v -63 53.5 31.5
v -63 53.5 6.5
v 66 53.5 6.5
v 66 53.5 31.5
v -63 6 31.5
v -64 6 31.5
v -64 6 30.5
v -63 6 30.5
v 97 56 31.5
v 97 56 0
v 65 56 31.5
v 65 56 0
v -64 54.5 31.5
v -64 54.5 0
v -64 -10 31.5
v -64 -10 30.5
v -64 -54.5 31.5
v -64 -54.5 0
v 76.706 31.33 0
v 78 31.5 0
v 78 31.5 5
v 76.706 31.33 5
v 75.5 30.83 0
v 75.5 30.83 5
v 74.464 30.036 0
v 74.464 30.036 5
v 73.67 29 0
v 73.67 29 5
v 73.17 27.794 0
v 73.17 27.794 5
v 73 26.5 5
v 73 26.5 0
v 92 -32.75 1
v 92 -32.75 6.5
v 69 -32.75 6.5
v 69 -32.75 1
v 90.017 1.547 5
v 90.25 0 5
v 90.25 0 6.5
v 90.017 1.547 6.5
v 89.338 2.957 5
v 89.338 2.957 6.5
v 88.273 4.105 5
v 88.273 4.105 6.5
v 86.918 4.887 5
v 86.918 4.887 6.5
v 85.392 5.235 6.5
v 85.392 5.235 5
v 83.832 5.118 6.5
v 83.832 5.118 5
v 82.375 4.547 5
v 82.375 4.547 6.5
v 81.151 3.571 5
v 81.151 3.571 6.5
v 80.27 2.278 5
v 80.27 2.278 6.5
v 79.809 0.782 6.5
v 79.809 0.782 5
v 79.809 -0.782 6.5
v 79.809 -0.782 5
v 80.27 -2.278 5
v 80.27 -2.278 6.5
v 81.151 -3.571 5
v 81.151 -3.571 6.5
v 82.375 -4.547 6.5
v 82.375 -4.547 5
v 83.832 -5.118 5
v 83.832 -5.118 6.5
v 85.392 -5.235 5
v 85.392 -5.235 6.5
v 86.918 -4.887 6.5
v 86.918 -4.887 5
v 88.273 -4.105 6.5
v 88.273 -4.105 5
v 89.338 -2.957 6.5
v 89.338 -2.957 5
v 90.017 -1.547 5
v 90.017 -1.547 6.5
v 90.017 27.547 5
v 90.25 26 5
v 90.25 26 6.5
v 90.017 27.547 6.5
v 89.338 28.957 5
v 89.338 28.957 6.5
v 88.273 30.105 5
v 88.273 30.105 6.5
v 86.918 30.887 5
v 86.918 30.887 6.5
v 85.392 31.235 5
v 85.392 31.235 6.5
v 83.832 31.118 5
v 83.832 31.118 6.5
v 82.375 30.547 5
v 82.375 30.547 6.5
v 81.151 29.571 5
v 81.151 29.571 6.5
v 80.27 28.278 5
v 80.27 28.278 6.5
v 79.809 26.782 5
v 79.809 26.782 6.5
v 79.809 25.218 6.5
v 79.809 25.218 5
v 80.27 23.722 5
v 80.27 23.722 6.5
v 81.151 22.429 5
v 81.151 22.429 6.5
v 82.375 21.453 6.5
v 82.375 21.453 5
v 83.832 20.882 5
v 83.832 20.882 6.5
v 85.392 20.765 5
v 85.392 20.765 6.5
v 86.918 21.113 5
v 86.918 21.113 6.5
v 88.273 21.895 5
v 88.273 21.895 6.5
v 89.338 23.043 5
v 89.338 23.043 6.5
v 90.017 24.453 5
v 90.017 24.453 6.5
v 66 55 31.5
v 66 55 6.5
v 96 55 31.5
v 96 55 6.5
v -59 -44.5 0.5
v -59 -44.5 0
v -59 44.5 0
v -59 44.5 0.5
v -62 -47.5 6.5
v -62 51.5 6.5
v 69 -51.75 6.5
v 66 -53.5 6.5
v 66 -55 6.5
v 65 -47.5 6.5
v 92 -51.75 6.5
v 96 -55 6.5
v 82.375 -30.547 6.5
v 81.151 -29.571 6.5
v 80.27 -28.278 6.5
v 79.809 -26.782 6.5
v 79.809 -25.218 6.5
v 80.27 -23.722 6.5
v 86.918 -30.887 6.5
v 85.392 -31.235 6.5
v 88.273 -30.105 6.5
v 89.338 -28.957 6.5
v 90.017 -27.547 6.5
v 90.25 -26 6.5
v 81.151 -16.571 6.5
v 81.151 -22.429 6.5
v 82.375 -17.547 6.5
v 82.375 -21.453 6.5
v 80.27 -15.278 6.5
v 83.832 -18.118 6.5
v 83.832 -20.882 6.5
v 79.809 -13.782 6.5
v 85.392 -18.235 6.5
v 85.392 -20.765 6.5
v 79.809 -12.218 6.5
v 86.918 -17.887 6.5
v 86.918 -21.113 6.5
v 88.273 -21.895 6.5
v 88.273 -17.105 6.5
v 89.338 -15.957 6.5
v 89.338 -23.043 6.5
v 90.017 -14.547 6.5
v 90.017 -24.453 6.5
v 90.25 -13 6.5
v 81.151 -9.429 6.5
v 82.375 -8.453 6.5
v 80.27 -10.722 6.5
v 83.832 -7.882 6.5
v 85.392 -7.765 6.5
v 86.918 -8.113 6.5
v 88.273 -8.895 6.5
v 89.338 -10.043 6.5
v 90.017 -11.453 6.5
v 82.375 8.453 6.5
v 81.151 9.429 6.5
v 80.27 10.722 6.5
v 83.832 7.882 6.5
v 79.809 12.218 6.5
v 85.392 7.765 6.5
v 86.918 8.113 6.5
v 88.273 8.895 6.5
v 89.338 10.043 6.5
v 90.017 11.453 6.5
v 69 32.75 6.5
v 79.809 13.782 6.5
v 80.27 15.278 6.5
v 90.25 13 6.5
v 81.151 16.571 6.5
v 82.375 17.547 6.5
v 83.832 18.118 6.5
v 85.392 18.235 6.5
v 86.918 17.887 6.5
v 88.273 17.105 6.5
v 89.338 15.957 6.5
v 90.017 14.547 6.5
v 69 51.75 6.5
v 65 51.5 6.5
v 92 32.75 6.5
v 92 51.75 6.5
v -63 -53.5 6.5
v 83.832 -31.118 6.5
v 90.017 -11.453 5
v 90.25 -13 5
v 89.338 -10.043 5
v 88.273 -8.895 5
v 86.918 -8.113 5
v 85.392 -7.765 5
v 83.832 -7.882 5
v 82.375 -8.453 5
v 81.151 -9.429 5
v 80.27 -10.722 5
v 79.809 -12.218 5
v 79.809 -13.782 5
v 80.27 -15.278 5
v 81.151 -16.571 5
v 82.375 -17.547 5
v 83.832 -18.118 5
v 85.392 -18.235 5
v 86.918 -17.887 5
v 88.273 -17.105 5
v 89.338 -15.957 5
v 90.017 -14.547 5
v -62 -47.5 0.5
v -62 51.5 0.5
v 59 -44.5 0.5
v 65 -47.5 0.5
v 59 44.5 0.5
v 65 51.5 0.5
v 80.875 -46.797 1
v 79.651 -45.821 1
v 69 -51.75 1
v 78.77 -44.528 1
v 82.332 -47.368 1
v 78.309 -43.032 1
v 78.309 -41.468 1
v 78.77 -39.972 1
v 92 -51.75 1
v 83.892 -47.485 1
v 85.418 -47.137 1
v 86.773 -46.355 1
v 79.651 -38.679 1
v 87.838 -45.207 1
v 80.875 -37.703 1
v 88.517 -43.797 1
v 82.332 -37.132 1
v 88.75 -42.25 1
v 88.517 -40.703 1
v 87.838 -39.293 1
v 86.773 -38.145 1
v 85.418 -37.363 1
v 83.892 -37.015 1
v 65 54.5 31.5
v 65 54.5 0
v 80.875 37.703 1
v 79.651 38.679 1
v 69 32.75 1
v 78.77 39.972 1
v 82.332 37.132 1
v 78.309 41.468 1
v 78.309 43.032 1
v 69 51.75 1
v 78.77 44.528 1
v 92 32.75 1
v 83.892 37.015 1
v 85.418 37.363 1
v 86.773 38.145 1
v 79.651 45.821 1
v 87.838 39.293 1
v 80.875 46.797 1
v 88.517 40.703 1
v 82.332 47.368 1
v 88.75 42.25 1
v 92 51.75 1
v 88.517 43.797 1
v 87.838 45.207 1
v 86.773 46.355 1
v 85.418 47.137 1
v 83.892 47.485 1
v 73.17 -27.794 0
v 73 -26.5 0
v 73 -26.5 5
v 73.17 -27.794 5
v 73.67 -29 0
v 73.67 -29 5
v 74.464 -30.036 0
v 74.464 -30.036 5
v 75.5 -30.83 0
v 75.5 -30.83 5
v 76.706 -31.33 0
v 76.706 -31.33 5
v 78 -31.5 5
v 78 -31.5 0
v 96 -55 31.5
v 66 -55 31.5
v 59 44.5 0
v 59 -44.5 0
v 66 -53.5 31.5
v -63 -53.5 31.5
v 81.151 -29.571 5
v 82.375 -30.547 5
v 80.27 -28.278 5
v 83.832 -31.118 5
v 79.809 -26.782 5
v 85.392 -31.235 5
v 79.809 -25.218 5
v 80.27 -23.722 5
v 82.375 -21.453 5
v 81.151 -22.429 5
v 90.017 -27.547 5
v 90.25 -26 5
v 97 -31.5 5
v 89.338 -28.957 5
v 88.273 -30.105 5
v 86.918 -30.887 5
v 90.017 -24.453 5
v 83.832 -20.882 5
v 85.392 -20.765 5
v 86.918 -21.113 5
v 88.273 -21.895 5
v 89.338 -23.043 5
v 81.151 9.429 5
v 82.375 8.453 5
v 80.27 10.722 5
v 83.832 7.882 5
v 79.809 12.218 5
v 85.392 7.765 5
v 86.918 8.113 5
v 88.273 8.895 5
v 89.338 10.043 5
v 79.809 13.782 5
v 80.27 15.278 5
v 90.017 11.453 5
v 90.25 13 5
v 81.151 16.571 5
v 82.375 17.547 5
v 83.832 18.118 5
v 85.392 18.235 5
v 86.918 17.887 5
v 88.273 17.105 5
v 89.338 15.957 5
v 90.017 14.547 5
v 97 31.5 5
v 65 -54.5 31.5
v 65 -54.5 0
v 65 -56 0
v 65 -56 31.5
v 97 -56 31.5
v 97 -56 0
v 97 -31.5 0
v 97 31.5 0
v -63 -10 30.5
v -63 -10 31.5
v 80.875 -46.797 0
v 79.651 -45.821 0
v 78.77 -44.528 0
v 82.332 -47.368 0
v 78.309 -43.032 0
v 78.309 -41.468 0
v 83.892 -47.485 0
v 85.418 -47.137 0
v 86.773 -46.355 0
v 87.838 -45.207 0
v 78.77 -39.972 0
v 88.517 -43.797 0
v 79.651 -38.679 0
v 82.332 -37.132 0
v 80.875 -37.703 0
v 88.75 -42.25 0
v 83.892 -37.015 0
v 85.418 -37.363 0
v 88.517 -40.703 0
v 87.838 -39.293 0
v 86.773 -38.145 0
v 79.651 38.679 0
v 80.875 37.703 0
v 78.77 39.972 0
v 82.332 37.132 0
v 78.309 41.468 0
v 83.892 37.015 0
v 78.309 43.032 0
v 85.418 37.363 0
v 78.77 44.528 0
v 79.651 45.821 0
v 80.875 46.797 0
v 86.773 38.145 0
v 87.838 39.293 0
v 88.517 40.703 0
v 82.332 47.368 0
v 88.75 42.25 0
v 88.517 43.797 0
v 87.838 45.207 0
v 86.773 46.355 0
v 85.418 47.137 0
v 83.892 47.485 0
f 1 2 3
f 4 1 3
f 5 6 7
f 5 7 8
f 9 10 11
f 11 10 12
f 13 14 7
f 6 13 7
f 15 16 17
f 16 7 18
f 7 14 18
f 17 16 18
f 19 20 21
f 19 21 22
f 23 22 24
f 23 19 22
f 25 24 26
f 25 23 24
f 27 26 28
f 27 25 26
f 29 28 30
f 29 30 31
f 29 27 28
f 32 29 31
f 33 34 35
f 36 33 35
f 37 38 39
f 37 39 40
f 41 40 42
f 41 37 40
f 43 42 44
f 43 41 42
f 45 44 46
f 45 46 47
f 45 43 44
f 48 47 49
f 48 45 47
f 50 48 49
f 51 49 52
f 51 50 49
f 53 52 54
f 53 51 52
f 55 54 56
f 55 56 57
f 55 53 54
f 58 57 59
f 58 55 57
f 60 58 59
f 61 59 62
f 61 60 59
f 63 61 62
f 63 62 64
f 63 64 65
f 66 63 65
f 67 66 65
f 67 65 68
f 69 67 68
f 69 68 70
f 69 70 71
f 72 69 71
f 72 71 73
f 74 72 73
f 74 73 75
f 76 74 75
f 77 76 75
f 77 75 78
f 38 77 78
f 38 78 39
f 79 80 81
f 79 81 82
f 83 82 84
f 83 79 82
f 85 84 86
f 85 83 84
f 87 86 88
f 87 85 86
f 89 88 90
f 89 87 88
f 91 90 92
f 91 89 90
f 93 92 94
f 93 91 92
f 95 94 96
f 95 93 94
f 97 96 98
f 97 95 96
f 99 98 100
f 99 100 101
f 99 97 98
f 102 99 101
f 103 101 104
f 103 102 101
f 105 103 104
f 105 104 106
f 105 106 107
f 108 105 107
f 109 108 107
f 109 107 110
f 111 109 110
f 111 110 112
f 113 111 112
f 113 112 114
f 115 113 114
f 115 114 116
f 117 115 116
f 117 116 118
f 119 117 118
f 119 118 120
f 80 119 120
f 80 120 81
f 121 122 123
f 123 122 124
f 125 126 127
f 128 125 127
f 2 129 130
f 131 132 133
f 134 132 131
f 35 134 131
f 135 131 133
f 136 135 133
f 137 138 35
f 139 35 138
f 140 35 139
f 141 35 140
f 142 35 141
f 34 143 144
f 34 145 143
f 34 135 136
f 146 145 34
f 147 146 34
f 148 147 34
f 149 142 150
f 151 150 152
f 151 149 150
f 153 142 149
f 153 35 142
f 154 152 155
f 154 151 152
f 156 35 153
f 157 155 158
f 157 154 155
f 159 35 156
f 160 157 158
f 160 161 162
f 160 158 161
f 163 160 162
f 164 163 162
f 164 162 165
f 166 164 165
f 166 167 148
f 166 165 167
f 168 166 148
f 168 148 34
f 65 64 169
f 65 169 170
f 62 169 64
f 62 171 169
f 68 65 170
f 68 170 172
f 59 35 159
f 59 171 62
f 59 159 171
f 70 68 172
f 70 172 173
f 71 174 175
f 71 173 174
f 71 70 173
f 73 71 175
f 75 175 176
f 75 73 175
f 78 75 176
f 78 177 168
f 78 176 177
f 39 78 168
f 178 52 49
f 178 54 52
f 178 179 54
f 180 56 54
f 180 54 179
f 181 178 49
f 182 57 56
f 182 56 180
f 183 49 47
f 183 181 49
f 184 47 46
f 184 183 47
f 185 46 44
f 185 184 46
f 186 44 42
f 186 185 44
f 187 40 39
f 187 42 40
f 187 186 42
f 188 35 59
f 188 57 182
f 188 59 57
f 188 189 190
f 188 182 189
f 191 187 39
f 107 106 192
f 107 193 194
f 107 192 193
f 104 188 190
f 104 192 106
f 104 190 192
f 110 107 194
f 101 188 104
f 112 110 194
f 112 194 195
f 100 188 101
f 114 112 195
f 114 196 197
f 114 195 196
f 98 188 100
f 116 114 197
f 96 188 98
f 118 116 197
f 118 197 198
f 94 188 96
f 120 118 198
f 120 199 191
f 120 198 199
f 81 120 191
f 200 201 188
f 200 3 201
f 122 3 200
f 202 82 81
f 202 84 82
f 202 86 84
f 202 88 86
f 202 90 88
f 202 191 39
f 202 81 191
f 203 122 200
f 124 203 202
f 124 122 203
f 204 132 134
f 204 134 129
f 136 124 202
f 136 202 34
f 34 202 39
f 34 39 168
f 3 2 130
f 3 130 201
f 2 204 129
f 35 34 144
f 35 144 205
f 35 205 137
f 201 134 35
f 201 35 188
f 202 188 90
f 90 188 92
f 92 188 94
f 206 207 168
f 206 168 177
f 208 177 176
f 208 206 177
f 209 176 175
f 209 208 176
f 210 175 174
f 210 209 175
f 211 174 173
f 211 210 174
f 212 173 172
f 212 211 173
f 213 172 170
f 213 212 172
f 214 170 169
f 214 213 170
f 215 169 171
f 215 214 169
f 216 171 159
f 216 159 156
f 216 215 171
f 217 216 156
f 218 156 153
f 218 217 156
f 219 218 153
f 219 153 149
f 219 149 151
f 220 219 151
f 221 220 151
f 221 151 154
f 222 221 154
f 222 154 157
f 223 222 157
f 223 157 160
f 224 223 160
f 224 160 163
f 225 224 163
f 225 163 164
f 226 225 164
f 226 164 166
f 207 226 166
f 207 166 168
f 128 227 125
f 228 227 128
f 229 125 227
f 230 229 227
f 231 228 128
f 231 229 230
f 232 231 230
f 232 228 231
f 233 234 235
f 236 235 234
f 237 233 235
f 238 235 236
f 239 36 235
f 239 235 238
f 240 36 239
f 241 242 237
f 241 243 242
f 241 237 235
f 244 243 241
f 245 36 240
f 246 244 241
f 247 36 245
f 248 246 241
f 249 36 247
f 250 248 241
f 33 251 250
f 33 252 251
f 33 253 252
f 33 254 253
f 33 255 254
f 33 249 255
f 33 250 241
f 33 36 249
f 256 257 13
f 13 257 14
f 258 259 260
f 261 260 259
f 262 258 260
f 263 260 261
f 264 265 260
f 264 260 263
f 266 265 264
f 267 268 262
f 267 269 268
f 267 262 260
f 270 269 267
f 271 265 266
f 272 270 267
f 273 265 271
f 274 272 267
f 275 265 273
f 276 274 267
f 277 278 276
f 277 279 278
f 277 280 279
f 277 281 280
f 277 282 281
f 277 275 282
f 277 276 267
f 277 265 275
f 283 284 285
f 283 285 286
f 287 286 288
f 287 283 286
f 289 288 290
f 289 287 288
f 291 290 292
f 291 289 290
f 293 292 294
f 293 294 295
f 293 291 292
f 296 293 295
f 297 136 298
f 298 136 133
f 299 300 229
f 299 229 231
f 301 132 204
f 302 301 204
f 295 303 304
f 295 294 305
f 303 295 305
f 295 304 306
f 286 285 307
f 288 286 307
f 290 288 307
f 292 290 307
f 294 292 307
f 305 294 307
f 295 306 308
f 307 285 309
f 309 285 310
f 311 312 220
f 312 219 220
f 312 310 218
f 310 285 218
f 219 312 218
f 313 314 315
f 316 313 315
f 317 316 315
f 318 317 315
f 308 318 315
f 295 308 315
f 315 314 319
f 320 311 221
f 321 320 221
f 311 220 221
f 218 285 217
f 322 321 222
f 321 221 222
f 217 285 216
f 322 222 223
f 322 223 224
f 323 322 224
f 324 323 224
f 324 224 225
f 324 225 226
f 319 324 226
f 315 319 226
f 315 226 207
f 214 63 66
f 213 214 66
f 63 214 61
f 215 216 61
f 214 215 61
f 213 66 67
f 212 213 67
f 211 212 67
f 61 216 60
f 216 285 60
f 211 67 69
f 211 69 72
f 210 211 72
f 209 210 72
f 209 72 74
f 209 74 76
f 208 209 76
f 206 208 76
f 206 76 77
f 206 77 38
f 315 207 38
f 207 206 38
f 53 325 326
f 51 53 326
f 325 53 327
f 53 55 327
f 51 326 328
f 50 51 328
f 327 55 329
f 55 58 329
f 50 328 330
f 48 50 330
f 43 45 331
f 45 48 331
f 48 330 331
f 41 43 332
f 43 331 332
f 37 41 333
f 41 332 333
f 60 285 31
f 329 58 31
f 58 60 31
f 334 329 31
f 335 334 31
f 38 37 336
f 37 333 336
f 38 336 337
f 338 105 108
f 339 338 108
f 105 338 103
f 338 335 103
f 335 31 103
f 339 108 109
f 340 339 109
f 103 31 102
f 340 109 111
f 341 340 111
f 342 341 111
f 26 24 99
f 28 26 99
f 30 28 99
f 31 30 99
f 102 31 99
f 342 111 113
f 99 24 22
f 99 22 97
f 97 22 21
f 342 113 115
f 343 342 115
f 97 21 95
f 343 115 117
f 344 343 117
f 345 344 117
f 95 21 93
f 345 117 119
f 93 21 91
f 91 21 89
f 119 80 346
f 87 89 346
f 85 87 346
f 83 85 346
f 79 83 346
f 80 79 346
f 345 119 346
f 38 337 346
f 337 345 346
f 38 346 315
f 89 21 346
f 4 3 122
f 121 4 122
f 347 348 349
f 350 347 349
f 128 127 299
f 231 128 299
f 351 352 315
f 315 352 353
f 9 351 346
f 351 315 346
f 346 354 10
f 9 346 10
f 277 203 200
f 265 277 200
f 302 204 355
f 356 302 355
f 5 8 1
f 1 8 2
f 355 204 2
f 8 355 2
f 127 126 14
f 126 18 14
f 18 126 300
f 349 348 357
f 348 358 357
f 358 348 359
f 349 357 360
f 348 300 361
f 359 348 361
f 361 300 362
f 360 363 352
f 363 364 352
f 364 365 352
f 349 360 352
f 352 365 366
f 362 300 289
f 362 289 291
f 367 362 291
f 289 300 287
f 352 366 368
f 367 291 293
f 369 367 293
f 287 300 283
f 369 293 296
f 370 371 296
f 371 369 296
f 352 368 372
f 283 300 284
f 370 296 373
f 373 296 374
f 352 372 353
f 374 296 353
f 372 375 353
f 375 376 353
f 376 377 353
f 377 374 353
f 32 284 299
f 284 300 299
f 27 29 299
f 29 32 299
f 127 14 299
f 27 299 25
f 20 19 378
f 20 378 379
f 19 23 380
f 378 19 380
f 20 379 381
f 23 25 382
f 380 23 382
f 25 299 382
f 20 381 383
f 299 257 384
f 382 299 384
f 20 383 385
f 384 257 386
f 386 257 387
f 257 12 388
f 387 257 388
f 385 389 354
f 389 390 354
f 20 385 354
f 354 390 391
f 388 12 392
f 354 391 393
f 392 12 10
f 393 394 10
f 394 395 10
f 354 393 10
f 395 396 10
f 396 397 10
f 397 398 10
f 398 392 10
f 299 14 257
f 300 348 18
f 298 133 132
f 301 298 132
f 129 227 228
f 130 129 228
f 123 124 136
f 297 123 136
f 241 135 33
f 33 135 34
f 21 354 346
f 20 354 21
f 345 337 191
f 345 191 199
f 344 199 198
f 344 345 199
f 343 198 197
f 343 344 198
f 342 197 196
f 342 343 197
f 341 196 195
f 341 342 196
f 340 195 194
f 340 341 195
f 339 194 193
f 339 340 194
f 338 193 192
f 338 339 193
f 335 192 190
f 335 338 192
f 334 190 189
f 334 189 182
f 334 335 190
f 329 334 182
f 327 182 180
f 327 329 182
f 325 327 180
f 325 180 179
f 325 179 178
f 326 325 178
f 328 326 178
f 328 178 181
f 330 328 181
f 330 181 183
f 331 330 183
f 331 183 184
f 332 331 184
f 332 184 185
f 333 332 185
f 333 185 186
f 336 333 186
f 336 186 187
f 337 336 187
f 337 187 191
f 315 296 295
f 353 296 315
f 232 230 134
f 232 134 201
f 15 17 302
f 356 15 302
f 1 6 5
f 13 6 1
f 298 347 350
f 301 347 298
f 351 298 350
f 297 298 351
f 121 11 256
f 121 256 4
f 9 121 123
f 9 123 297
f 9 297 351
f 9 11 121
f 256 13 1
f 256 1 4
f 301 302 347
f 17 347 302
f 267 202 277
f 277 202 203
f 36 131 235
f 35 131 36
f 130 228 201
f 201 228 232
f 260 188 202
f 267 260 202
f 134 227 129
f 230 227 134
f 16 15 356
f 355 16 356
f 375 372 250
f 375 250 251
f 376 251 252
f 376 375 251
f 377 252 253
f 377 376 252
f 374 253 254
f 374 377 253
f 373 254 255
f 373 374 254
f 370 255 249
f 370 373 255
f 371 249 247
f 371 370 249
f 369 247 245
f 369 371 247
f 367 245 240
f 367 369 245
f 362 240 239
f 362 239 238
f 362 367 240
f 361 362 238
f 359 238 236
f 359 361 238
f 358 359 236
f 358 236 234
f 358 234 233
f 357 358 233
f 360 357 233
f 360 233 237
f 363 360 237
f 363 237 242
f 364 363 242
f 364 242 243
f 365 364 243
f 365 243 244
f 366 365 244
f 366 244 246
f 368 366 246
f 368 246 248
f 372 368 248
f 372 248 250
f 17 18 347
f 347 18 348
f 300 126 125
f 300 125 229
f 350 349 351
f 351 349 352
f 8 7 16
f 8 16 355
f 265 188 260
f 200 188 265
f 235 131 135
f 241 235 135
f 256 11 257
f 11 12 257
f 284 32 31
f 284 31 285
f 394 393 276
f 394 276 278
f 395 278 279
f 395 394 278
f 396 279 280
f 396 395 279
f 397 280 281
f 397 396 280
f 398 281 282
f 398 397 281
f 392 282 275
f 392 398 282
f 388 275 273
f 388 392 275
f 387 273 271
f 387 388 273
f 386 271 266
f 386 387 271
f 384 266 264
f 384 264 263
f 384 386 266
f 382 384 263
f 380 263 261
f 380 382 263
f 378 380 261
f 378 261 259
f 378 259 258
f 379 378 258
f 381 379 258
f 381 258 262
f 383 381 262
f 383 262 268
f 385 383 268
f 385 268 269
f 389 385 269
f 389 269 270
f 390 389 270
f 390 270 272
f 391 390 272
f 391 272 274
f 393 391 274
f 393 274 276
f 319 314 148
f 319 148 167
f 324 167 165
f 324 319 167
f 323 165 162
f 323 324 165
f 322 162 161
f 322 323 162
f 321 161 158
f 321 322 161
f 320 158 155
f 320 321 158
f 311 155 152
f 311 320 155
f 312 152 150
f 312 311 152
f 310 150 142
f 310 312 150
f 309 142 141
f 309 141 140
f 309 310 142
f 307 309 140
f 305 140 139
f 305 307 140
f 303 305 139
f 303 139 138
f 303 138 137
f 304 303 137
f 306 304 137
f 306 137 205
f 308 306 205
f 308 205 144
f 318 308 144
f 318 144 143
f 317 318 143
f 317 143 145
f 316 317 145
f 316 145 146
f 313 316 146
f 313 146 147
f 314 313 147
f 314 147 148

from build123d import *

# Parameters (mm, degrees)
F0_W      = 127
F0_H      = 99
F2_DEPTH  = 6.5
F0_W_2    = 118
F0_H_2    = 89
F3_DEPTH  = 0.5
F5_DEPTH  = 25
F1_R      = 5.25
F6_DEPTH  = 6.5
F7_W      = 6
F7_H      = 19
F7_W_2    = 17
F7_R      = 5.25
F8_DEPTH  = 5.5
F9_R      = 5.25
F10_DEPTH = 5
F11_W     = 1
F11_H     = 16
F12_DEPTH = 1


with BuildPart() as f2:
    # F0 (on Top) → F2 (new body)
    with BuildSketch(Plane.XY):
        Polygon((97, 56), (65, 56), (65, 54.5), (-64, 54.5), (-64, -54.5), (65, -54.5), (65, -56), (97, -56), align=None)
        with Locations((1.5, 2)):
            Rectangle(F0_W, F0_H, mode=Mode.SUBTRACT)
    extrude(amount=F2_DEPTH)

    # F0 (on Top) → F3 (join)
    with BuildSketch(Plane.XY):
        with Locations((1.5, 2)):
            Rectangle(F0_W, F0_H)
        Rectangle(F0_W_2, F0_H_2, mode=Mode.SUBTRACT)
    extrude(amount=F3_DEPTH)

    # F4 (on face) → F5 (join)
    with BuildSketch(Plane.XY.offset(6.5)):
        Polygon((97, -56), (97, 56), (65, 56), (65, 54.5), (-64, 54.5), (-64, -54.5), (65, -54.5), (65, -56), align=None)
        Polygon((-63, -53.5), (-63, 53.5), (66, 53.5), (66, 55), (96, 55), (96, -55), (66, -55), (66, -53.5), align=None, mode=Mode.SUBTRACT)
    extrude(amount=F5_DEPTH)

    # F1 (on face) → F6 (cut, through all)
    with BuildSketch(Plane.XY):
        with Locations((83.5, -42.25)):
            Circle(F1_R)
        with Locations((83.5, 42.25)):
            Circle(F1_R)
        with Locations((85, -26)):
            Circle(F1_R)
        with Locations((85, -13)):
            Circle(F1_R)
        with Locations((85, 0)):
            Circle(F1_R)
        with Locations((85, 13)):
            Circle(F1_R)
        with Locations((85, 26)):
            Circle(F1_R)
    extrude(amount=F6_DEPTH, mode=Mode.SUBTRACT)

    # F7 (on face) → F8 (cut)
    with BuildSketch(Plane.XY.offset(6.5)):
        with Locations((72, 42.25)):
            Rectangle(F7_W, F7_H)
        with Locations((83.5, 42.25)):
            Rectangle(F7_W_2, F7_H)
        with Locations((83.5, 42.25)):
            Circle(F7_R, mode=Mode.SUBTRACT)
        with Locations((72, -42.25)):
            Rectangle(F7_W, F7_H)
        with Locations((83.5, -42.25)):
            Rectangle(F7_W_2, F7_H)
        with Locations((83.5, -42.25)):
            Circle(F7_R, mode=Mode.SUBTRACT)
    extrude(amount=-F8_DEPTH, mode=Mode.SUBTRACT)

    # F9 (on face) → F10 (cut)
    with BuildSketch(Plane.XY):
        with BuildLine():
            Line((97, -31.5), (97, 31.5))
            Line((97, 31.5), (78, 31.5))
            ThreePointArc((78, 31.5), (74.464466, 30.035534), (73, 26.5))
            Line((73, 26.5), (73, -26.5))
            ThreePointArc((73, -26.5), (74.464466, -30.035534), (78, -31.5))
            Line((78, -31.5), (97, -31.5))
        make_face()
        with Locations((85, 0)):
            Circle(F9_R, mode=Mode.SUBTRACT)
    extrude(amount=F10_DEPTH, mode=Mode.SUBTRACT)

    # F11 (on face) → F12 (cut)
    with BuildSketch(Plane.XY.offset(31.5)):
        with Locations((-63.5, -2)):
            Rectangle(F11_W, F11_H)
    extrude(amount=-F12_DEPTH, mode=Mode.SUBTRACT)


solid = f2.part
